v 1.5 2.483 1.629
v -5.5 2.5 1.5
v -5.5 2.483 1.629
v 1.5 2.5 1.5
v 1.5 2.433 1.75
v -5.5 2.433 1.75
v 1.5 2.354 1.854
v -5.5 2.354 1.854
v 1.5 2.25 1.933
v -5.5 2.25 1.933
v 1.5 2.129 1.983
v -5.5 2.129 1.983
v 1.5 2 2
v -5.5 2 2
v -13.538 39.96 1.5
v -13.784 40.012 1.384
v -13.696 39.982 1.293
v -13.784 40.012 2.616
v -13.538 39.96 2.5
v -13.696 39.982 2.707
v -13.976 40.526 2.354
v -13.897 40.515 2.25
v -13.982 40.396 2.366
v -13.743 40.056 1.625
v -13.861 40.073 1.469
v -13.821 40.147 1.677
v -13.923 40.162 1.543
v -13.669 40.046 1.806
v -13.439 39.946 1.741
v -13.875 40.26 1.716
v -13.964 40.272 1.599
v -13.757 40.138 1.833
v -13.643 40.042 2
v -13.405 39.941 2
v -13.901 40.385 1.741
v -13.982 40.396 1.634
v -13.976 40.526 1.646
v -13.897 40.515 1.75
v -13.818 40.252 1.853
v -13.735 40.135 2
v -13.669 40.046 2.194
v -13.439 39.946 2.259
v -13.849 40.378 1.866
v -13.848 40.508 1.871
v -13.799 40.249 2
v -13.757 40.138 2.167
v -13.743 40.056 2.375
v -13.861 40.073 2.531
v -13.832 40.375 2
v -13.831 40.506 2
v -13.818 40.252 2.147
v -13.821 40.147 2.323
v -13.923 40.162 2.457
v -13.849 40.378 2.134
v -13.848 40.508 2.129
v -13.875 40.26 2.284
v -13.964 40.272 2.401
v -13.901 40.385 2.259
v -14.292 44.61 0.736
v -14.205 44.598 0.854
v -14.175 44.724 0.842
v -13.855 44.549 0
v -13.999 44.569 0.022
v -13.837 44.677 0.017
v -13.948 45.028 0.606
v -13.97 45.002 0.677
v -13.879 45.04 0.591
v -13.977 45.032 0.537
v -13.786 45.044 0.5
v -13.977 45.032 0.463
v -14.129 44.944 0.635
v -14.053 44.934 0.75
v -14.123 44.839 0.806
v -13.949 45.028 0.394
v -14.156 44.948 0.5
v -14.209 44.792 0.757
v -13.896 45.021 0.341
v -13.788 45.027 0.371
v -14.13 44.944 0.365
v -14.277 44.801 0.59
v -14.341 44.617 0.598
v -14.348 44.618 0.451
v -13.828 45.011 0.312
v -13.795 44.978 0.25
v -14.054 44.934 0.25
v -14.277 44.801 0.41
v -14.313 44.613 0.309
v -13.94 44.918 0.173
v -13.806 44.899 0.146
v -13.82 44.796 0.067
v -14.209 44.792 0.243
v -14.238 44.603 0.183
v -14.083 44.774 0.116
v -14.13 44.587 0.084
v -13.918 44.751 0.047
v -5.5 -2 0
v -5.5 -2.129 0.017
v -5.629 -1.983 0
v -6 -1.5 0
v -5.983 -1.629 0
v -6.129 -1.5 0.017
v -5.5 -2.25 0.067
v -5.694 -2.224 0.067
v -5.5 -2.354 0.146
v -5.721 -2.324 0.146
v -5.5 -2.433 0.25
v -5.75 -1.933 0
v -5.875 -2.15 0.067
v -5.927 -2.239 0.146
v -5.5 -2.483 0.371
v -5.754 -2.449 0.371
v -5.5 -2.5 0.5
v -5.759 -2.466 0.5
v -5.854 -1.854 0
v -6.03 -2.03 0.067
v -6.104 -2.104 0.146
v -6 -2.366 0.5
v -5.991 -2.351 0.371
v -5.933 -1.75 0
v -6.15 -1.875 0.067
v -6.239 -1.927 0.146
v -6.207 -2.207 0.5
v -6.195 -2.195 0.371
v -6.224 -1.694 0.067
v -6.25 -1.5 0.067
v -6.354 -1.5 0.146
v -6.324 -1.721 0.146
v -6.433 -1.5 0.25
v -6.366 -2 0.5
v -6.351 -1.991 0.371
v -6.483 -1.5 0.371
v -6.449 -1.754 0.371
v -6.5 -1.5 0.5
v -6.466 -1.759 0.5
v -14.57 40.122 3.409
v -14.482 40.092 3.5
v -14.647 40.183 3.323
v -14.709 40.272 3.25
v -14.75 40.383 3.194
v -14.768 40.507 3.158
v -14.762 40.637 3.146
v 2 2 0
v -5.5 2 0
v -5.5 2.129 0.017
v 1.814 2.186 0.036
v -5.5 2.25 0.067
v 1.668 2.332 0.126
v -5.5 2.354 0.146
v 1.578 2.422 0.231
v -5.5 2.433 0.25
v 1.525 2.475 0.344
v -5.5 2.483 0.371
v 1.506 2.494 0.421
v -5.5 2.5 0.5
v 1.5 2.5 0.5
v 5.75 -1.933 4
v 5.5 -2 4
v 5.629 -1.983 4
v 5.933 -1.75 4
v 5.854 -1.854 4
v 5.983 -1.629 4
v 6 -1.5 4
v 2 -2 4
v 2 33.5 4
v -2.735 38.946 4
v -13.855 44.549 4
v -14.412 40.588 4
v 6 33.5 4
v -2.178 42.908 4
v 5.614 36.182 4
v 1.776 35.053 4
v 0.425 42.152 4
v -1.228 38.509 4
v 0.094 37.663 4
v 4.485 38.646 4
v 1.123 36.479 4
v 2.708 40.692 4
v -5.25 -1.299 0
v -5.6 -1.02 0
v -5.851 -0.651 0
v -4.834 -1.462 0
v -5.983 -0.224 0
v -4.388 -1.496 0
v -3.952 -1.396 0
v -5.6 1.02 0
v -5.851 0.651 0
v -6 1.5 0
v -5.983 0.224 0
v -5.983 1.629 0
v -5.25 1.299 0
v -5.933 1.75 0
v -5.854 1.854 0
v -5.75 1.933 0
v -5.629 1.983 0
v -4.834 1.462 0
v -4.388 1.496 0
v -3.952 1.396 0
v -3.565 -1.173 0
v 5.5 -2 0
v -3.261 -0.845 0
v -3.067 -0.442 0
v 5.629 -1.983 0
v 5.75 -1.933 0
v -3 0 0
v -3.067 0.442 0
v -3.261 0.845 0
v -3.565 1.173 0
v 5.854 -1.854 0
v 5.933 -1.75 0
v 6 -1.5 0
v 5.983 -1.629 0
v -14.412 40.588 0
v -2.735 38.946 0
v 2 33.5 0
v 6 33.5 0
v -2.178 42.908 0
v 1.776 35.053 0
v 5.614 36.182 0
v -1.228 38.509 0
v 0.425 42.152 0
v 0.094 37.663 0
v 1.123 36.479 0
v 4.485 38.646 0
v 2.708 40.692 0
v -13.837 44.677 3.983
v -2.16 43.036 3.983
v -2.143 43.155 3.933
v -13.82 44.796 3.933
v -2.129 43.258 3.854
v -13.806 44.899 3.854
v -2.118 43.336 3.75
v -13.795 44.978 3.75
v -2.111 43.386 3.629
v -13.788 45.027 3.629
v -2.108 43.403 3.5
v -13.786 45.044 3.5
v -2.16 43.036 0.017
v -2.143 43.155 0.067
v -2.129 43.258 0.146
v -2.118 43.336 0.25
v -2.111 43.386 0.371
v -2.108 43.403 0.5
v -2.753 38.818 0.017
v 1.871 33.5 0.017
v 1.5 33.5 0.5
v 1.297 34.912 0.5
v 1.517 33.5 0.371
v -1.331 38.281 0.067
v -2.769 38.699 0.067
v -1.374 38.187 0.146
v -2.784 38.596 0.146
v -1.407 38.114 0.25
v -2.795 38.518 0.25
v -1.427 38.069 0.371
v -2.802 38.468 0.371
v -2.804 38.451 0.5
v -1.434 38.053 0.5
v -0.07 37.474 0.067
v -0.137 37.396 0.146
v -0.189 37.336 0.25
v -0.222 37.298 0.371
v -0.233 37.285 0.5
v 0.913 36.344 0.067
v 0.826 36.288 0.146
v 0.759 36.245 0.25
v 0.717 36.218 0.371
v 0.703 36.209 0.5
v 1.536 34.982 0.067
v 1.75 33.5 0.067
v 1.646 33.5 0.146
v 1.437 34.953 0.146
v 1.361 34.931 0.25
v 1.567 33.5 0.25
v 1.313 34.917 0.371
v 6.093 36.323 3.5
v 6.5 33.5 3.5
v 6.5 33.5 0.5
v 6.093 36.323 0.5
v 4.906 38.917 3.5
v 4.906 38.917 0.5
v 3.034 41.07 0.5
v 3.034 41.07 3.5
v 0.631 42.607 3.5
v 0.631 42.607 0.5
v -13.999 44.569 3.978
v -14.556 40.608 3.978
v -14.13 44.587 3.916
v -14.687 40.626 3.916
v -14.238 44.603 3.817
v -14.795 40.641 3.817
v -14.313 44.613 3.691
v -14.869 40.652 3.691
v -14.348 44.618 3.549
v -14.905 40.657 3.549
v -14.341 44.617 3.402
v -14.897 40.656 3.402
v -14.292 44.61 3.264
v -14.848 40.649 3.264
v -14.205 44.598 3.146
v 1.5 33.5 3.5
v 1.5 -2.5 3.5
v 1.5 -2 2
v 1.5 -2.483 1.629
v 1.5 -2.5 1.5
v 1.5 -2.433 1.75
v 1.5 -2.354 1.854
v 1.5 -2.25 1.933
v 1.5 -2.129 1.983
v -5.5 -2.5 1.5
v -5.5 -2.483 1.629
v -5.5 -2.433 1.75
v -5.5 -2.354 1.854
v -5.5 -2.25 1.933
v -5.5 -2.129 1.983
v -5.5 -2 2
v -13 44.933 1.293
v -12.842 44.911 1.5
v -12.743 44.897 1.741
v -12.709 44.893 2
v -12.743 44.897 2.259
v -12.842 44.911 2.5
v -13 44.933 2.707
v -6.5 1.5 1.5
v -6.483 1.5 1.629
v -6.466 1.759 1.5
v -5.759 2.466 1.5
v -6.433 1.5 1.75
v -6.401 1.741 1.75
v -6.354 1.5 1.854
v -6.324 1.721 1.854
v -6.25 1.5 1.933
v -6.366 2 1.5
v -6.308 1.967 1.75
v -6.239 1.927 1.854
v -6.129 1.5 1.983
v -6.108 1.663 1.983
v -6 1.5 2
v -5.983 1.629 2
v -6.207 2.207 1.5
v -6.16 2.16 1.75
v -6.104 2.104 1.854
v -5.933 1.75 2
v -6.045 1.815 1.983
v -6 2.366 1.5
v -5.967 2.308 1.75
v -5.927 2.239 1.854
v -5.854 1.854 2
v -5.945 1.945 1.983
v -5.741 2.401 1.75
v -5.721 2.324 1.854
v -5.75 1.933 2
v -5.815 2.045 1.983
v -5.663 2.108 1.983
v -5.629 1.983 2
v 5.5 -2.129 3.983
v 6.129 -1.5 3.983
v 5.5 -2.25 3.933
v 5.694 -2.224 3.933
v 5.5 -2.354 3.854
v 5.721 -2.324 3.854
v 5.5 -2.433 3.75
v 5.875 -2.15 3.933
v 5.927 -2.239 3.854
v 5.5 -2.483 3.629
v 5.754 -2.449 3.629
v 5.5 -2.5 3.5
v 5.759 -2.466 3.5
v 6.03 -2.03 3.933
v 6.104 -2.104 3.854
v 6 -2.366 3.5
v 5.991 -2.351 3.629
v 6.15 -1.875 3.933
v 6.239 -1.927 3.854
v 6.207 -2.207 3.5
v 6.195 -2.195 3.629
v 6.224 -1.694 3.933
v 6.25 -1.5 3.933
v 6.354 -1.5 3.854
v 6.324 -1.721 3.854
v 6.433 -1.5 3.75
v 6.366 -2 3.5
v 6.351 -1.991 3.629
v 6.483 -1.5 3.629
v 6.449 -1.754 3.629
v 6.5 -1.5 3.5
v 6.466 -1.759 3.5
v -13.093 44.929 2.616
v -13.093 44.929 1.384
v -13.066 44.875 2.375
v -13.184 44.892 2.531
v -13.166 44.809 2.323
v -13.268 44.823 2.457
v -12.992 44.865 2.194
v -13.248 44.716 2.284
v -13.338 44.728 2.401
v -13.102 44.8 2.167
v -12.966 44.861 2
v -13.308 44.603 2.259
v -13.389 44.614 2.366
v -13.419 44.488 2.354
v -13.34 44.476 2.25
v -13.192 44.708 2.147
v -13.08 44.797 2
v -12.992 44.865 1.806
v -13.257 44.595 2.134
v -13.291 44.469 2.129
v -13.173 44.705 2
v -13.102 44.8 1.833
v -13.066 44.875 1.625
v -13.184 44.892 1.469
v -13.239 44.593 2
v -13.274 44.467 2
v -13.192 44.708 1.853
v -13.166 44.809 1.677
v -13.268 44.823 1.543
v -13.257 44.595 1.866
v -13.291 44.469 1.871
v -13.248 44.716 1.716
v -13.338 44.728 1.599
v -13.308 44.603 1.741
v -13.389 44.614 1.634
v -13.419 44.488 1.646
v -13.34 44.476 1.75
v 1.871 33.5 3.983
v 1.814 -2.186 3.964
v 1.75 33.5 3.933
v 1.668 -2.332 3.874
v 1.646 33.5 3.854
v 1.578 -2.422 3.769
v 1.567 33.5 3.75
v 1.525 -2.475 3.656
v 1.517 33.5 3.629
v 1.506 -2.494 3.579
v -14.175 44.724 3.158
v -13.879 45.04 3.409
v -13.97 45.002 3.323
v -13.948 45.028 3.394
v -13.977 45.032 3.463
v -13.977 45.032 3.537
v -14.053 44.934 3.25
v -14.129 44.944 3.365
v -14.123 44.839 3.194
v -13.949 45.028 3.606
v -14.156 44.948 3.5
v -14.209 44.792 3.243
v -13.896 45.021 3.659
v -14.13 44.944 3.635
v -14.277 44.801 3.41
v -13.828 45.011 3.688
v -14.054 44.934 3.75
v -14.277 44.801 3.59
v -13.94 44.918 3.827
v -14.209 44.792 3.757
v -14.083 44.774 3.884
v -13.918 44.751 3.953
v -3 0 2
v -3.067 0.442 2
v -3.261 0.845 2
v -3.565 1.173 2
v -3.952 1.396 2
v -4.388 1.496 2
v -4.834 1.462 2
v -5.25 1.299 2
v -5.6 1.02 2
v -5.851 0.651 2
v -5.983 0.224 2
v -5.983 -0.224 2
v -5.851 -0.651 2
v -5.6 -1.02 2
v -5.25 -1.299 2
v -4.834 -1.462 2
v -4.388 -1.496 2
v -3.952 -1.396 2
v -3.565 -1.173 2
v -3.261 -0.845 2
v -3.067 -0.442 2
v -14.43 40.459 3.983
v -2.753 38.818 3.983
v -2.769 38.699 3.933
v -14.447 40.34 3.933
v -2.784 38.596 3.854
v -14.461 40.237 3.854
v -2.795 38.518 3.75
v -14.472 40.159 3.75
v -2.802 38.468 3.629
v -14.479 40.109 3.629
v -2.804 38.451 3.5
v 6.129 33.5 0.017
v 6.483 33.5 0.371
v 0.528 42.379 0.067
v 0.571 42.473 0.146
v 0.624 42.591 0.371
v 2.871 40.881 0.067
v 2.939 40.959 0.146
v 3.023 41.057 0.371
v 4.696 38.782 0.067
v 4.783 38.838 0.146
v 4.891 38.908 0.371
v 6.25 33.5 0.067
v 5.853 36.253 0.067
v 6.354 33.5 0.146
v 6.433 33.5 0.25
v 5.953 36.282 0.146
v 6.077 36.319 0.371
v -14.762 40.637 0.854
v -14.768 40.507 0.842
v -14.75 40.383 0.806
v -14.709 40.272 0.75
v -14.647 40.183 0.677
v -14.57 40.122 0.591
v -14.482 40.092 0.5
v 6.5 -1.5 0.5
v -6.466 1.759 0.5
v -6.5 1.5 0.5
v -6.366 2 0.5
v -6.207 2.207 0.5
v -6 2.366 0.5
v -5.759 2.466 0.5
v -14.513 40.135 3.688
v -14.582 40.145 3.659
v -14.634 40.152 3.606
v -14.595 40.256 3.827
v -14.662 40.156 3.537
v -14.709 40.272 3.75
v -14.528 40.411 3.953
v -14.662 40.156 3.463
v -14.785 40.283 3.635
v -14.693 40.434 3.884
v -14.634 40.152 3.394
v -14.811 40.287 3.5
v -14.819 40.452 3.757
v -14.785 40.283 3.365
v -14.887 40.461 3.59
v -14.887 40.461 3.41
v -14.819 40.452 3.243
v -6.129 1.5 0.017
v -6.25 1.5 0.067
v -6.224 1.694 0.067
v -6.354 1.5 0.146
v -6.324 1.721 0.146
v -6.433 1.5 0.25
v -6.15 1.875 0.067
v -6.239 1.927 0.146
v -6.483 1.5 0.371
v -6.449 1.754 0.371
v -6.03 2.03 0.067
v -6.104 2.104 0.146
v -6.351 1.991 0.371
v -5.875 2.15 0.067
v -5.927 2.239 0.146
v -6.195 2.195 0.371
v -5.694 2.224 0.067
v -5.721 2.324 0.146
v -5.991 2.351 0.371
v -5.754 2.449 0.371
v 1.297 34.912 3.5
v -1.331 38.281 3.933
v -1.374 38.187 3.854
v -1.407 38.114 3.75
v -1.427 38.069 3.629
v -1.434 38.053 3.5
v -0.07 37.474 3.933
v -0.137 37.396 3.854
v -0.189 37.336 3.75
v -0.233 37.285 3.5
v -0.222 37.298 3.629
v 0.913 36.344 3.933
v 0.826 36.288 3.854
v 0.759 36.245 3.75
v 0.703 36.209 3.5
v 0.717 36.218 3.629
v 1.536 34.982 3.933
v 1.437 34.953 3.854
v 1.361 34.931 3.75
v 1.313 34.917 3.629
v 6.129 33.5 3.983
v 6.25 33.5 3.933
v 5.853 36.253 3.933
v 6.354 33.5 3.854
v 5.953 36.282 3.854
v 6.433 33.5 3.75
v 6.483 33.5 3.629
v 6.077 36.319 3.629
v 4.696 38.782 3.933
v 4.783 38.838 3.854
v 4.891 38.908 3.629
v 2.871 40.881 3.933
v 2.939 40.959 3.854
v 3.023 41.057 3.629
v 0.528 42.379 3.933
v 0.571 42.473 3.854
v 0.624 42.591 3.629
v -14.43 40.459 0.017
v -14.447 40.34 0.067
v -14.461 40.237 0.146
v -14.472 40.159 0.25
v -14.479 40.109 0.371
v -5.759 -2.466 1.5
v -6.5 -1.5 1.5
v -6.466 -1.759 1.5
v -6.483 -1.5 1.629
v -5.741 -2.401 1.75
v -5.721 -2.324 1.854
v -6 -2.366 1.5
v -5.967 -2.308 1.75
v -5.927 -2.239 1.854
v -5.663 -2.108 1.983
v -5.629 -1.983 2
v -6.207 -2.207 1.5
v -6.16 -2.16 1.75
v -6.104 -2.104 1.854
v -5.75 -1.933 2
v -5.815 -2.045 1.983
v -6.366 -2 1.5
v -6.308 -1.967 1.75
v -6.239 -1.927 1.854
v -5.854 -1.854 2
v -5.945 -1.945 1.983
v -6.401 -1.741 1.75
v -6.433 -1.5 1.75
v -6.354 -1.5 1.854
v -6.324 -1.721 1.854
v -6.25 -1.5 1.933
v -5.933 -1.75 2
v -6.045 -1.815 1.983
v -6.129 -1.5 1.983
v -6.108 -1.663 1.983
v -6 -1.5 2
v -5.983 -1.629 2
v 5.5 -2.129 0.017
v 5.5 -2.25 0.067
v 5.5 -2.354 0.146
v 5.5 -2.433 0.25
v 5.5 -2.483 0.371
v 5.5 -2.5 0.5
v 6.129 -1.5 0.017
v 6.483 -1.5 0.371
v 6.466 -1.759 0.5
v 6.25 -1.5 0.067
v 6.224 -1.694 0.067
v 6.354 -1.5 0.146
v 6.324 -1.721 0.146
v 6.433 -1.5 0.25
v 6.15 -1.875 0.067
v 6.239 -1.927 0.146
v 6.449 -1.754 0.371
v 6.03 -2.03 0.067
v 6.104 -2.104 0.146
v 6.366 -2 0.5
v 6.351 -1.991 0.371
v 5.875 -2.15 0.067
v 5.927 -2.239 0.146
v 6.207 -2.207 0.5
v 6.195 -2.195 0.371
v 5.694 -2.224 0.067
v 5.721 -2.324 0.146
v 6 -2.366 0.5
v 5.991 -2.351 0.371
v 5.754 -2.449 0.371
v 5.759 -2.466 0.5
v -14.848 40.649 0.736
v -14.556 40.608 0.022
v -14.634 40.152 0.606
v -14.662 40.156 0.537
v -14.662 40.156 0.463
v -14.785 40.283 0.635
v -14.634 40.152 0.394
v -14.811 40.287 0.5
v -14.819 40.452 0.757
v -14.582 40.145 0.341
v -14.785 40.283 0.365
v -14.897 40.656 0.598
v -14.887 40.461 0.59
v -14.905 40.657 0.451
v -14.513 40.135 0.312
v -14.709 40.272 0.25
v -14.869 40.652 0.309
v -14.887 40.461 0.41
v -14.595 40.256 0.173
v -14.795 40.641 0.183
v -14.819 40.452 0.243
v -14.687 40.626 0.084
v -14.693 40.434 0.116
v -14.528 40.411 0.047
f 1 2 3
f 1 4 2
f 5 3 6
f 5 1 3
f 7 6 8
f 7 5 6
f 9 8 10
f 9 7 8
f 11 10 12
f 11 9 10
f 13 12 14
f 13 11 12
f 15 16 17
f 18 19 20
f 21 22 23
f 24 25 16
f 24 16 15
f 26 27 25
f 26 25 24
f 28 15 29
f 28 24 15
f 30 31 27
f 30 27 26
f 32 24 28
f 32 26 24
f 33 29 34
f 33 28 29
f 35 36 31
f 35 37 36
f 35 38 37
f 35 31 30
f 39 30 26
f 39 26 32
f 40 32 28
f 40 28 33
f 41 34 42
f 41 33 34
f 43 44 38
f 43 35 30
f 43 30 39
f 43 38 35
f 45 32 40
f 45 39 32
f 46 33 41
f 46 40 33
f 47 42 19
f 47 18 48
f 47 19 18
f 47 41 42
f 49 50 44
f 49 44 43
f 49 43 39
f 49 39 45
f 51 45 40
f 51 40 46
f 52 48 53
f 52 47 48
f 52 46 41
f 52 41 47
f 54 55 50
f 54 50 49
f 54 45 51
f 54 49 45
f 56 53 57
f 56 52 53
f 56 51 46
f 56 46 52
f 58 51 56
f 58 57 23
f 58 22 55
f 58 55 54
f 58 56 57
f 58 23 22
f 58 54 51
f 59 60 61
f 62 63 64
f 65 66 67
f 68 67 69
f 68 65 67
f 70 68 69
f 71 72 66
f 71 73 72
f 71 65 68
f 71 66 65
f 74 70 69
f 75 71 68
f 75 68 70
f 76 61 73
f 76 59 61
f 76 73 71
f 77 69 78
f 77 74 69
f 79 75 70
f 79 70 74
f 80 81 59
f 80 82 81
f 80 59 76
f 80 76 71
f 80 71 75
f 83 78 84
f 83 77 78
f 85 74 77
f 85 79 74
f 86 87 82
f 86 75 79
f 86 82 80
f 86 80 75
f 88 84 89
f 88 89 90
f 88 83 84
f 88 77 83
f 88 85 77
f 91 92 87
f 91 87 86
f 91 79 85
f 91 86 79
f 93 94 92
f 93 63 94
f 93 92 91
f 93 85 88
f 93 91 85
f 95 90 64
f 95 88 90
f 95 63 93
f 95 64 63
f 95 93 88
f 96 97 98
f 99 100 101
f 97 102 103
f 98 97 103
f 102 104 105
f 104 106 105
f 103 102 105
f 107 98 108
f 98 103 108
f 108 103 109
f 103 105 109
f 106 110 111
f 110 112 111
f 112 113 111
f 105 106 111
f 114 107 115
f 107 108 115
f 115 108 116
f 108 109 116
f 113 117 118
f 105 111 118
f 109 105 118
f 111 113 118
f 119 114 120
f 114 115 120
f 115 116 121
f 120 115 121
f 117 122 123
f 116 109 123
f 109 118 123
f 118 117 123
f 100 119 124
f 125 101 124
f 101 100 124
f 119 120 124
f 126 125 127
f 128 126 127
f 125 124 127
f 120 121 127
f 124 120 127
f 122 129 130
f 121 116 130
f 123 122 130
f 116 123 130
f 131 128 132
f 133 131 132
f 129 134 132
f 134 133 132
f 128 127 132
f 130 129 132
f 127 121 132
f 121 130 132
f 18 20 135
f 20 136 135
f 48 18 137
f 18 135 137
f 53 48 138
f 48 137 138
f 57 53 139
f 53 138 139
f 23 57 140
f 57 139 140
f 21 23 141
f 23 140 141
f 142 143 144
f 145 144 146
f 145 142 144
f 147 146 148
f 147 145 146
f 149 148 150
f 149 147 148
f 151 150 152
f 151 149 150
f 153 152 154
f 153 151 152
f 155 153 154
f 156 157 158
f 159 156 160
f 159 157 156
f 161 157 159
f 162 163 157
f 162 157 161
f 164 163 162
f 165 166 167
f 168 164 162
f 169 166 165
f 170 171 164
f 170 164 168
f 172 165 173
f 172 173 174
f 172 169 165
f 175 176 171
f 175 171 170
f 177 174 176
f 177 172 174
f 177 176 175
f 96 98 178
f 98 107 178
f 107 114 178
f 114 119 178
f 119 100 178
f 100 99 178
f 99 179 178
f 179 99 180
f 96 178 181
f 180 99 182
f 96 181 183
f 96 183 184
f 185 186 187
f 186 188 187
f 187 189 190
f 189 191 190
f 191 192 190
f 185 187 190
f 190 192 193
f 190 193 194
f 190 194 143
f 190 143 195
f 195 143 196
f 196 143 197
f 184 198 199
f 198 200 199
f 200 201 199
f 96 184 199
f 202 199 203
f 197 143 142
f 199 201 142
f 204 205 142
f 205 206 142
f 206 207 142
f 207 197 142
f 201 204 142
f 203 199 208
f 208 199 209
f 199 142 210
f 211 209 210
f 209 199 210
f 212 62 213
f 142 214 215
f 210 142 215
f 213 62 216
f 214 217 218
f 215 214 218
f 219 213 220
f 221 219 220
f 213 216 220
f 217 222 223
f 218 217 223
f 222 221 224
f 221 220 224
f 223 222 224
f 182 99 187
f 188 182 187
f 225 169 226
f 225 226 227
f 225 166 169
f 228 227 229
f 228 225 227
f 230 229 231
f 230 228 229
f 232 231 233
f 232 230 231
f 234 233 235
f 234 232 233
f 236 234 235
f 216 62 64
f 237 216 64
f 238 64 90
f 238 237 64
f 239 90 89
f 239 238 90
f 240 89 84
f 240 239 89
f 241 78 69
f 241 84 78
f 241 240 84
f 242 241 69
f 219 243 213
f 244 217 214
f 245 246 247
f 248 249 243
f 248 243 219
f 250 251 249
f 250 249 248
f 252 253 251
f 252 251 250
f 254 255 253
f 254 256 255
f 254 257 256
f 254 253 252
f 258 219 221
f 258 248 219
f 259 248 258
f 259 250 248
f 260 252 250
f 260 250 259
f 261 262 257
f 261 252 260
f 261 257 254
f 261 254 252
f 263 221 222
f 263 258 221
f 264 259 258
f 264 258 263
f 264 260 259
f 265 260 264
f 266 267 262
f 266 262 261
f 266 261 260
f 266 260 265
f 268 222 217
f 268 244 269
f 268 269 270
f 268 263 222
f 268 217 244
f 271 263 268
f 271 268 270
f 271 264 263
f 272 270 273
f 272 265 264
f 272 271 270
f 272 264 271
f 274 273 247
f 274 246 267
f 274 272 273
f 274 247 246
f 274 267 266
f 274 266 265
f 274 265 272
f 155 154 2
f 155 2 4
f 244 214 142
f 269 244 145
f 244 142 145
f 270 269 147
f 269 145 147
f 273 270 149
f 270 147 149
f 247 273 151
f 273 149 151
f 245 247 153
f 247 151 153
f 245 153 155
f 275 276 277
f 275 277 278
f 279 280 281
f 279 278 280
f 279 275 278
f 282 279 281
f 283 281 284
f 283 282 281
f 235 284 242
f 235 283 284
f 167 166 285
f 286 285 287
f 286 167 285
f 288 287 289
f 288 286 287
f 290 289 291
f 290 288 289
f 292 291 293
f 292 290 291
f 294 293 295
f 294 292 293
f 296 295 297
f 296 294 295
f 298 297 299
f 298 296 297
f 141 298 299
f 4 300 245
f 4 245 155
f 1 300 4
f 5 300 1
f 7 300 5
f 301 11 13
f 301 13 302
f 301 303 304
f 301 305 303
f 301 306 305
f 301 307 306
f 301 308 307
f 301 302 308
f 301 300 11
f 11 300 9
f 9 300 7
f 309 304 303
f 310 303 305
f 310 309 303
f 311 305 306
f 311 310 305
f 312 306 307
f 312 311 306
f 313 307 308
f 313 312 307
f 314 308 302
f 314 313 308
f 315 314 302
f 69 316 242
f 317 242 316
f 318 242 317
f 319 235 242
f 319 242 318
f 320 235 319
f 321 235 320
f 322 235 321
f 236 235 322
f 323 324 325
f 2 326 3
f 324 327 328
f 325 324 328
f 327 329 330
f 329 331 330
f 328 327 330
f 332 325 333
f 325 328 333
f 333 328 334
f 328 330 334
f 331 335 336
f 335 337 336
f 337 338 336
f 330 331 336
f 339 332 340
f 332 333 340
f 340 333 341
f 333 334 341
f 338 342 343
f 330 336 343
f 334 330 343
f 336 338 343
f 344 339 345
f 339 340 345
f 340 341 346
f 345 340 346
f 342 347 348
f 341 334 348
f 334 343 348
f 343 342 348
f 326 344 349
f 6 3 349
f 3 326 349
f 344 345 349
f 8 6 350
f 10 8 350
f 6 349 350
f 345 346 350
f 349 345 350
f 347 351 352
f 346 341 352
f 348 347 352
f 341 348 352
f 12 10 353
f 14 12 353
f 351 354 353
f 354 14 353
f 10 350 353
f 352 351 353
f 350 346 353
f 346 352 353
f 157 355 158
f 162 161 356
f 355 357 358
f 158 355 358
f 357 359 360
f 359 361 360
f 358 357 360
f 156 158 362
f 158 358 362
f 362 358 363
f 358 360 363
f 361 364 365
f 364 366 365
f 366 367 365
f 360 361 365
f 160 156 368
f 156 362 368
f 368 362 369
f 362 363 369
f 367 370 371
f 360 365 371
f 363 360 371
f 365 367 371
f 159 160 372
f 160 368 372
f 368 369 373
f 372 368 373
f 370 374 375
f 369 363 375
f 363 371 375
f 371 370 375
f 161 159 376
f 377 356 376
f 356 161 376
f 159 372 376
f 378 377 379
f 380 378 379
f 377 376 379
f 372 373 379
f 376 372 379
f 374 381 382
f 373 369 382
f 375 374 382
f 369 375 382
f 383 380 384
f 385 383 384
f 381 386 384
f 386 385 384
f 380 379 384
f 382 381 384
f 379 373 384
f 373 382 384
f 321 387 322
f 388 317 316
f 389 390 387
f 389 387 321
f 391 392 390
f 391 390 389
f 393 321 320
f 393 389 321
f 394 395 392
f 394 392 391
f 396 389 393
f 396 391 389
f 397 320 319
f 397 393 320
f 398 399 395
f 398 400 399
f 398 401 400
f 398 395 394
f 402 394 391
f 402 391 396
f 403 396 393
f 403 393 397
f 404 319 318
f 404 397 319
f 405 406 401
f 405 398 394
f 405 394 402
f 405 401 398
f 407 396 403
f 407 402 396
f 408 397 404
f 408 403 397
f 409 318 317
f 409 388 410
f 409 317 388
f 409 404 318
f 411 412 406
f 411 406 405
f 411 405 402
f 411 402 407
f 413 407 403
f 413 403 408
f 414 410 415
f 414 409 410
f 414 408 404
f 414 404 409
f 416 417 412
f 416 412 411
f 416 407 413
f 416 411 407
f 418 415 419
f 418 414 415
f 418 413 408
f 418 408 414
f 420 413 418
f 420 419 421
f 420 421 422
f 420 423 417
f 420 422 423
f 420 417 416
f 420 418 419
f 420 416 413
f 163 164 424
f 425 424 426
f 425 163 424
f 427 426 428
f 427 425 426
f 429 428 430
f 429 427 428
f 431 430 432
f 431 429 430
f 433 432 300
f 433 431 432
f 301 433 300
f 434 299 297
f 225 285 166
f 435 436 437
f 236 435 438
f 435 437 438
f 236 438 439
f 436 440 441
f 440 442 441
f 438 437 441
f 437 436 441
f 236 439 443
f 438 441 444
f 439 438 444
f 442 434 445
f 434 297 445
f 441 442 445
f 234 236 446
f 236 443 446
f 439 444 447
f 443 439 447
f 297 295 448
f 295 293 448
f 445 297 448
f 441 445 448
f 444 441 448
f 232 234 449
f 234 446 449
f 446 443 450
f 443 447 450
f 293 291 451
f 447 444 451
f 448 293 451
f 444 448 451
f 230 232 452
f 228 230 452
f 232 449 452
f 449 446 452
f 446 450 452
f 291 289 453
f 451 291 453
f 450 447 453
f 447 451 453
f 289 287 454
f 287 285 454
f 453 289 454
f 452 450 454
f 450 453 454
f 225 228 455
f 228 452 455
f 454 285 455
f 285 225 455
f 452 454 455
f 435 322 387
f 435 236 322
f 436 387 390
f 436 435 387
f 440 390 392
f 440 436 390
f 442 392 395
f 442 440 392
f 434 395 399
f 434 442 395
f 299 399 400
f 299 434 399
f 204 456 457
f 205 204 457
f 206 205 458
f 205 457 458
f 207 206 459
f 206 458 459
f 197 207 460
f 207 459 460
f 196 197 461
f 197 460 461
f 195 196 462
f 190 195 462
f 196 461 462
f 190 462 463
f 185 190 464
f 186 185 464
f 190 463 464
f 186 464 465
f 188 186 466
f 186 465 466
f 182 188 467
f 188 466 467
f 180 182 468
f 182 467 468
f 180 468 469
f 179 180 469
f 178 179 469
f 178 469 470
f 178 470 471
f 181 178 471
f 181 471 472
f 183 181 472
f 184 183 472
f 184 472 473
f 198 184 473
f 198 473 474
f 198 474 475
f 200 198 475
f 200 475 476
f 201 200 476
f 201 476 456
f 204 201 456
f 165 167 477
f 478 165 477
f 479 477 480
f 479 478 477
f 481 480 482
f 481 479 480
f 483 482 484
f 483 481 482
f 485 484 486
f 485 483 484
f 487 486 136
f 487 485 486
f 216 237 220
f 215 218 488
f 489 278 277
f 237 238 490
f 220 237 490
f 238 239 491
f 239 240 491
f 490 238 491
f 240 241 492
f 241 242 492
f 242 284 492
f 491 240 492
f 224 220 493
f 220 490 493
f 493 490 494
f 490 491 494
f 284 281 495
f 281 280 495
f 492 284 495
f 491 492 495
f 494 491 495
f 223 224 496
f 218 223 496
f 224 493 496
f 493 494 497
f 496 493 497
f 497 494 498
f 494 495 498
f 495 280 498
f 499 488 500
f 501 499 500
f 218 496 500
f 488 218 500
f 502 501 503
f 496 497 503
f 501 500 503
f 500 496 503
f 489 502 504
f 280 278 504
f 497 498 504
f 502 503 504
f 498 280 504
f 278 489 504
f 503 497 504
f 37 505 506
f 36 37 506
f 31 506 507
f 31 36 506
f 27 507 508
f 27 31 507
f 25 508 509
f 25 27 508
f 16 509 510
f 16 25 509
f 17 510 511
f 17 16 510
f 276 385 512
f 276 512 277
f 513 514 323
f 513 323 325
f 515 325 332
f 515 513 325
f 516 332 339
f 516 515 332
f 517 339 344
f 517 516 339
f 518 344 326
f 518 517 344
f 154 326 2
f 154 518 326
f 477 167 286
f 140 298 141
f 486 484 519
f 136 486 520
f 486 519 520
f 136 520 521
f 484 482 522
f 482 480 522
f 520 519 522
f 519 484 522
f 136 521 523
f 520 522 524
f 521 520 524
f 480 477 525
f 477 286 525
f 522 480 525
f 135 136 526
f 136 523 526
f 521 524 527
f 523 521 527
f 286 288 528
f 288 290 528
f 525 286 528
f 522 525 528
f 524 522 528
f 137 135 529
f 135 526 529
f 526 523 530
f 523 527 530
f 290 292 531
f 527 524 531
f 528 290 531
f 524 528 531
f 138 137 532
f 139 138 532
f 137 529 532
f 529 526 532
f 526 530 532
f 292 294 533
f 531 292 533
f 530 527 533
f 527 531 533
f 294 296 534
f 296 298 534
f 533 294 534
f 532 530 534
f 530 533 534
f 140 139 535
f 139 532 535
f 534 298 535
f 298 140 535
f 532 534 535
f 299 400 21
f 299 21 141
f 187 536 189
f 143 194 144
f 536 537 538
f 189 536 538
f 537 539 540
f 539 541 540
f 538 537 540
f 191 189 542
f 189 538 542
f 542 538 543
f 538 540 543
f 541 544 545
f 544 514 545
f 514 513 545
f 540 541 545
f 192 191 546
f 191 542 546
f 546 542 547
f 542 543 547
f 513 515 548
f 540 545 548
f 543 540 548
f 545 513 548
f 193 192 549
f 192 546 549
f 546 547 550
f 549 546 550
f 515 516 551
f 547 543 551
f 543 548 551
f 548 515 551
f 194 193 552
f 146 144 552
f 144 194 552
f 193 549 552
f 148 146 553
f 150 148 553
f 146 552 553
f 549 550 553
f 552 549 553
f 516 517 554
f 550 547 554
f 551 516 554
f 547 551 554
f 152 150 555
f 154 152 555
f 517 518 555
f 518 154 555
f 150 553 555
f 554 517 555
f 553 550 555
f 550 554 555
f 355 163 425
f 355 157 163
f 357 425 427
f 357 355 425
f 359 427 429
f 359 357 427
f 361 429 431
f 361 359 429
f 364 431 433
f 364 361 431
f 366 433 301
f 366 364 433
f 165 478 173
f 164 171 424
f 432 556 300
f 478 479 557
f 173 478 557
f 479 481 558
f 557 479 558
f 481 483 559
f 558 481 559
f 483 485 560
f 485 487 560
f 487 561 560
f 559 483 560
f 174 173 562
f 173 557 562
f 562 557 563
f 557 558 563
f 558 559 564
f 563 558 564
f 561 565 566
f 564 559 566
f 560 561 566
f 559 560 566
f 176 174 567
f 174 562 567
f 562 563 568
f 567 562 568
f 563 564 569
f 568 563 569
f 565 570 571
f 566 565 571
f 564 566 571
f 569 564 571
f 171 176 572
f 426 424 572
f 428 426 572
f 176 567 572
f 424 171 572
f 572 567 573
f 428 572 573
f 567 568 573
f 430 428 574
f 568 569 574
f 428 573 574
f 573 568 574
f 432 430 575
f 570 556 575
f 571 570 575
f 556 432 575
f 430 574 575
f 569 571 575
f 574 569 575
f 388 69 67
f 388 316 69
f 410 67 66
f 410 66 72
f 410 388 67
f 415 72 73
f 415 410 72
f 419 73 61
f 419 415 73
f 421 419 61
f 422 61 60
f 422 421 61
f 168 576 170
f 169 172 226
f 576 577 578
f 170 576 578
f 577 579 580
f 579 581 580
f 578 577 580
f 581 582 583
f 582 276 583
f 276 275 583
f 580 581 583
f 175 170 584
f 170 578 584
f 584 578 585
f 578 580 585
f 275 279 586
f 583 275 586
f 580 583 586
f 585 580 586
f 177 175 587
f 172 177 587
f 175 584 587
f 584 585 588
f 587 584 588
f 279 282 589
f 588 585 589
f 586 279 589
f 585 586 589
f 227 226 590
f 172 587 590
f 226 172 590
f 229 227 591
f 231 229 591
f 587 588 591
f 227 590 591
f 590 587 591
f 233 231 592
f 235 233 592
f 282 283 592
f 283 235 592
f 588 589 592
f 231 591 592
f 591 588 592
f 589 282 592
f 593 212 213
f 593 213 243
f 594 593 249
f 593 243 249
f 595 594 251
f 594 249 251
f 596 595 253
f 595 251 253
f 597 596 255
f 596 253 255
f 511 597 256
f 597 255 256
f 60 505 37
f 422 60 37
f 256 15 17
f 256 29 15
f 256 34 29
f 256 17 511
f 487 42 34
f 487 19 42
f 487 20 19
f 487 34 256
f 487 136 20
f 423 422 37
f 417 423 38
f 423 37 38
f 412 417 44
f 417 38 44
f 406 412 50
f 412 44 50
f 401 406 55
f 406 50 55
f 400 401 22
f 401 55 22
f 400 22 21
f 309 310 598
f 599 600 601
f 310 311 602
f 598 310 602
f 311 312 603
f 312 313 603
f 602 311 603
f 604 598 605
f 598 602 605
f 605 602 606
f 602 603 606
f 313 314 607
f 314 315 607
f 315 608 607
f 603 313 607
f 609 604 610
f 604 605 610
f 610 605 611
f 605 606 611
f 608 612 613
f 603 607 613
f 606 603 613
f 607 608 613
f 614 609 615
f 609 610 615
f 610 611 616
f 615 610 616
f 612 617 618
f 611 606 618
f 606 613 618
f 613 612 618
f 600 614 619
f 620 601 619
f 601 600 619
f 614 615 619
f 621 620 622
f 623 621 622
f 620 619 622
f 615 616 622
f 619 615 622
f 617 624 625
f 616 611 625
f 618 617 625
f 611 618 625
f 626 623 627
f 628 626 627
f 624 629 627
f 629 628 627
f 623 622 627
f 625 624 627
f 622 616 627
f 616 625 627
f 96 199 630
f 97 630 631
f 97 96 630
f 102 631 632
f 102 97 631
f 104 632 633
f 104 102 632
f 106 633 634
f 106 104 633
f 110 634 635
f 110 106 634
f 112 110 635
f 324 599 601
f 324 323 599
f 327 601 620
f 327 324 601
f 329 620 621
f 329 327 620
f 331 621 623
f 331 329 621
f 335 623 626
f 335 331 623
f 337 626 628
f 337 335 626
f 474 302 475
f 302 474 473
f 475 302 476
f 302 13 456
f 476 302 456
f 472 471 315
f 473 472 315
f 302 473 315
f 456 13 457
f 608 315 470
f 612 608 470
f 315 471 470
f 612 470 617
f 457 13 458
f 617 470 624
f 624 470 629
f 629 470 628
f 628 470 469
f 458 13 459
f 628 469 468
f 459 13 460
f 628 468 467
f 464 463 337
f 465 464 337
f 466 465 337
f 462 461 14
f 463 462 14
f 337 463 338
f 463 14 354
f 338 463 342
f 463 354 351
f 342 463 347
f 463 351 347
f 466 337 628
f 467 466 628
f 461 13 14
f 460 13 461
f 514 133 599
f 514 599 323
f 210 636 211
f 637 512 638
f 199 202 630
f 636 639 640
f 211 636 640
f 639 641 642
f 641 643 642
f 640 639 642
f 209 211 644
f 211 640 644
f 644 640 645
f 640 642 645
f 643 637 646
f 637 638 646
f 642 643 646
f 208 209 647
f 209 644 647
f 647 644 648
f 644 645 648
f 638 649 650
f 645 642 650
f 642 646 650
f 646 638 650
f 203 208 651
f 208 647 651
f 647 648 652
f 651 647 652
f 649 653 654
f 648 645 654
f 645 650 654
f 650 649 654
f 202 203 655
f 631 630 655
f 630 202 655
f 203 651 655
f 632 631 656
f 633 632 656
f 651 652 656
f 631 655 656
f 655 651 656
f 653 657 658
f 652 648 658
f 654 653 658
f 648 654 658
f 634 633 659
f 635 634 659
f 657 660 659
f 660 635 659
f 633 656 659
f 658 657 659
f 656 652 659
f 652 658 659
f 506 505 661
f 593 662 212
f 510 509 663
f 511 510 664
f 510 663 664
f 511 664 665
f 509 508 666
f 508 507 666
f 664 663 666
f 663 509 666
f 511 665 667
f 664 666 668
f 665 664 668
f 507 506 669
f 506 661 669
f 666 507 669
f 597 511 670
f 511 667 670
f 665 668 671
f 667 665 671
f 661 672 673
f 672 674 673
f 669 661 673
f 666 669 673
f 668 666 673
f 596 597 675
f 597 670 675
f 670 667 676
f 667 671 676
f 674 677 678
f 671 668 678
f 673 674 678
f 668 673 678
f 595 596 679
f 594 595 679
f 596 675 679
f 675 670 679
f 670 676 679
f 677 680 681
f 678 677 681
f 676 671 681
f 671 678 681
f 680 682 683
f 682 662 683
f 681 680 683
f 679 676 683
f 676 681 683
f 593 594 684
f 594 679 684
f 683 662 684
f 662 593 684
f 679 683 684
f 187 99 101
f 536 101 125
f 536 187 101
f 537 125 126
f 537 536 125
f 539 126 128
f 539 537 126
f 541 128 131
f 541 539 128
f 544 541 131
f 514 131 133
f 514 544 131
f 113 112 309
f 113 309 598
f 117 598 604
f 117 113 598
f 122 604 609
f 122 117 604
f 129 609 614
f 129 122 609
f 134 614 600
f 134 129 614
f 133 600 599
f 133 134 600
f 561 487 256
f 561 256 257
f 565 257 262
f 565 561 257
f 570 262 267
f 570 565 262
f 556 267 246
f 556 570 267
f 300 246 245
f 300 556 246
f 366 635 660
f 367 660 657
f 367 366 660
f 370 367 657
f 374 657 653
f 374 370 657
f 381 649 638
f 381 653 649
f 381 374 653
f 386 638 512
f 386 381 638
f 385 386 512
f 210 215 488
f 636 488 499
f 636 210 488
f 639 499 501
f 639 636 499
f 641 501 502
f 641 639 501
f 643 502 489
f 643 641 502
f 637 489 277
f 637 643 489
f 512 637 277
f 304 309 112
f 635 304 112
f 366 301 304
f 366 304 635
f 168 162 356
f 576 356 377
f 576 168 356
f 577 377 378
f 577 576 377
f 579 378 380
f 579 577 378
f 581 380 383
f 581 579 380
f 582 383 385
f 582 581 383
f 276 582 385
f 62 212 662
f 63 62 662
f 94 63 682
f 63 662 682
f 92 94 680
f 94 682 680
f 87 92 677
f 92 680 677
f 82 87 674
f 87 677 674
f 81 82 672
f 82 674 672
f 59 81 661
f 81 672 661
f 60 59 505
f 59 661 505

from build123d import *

# Parameters (mm, degrees)
EXTRUDE_1_DEPTH     = 2
EXTRUDE_2_DEPTH     = 2
CUT_EXTRUDE_1_DEPTH = 5
SKETCH_4_R          = 1.5
CUT_EXTRUDE_2_DEPTH = 48.894743495
FILLET_1_R          = 0.5


with BuildPart() as part:
    # 草图1 → 凸台-拉伸1 (new body)
    with BuildSketch(Plane.XY):
        with BuildLine():
            Line((-5.5, 2.5), (5.5, 2.5))
            ThreePointArc((5.5, 2.5), (6.207106781, 2.207106781), (6.5, 1.5))
            Line((6.5, 1.5), (6.5, -1.5))
            ThreePointArc((6.5, -1.5), (6.207106781, -2.207106781), (5.5, -2.5))
            Line((5.5, -2.5), (-5.5, -2.5))
            ThreePointArc((-5.5, -2.5), (-6.207106781, -2.207106781), (-6.5, -1.5))
            Line((-6.5, -1.5), (-6.5, 1.5))
            ThreePointArc((-6.5, 1.5), (-6.207106781, 2.207106781), (-5.5, 2.5))
        make_face()
    extrude(amount=EXTRUDE_1_DEPTH)

    # 草图2 → 凸台-拉伸2 (add, symmetric)
    with BuildSketch(Plane.XY.offset(2)):
        with BuildLine():
            Line((6.5, 1.5), (6.5, 33.5))
            ThreePointArc((6.5, 33.5), (4.047095802, 40.06059029), (-2.10826899, 43.402680687))
            Line((-2.10826899, 43.402680687), (-14.981753884, 45.211931))
            Line((-14.981753884, 45.211931), (-15.677619389, 40.260590656))
            Line((-15.677619389, 40.260590656), (-2.804134495, 38.451340344))
            ThreePointArc((-2.804134495, 38.451340344), (0.273547901, 36.780295145), (1.5, 33.5))
            Line((1.5, 33.5), (1.5, 2.5))
            Line((1.5, 2.5), (1.5, -2.5))
            Line((1.5, -2.5), (5.5, -2.5))
            ThreePointArc((5.5, -2.5), (6.207106781, -2.207106781), (6.5, -1.5))
            Line((6.5, -1.5), (6.5, 1.5))
        make_face()
    extrude(amount=EXTRUDE_2_DEPTH, both=True)

    # 草图3 → 切除-拉伸1 (cut)
    with BuildSketch(Plane(origin=(5.940864687, 42.271448722, 0), x_dir=(0.9902680687415704, -0.13917310096006608, 0), z_dir=(0.13917310096006608, 0.9902680687415704, 0))):
        Polygon((-21.128237123, 0), (-19.126013359, -2), (-21.128237123, -4), align=None)
    extrude(amount=-CUT_EXTRUDE_1_DEPTH, mode=Mode.SUBTRACT)

    # 草图4 → 切除-拉伸2 (cut, through all)
    with BuildSketch(Plane.XY.offset(2)):
        with Locations((-4.5, 0)):
            Circle(SKETCH_4_R)
    extrude(amount=-CUT_EXTRUDE_2_DEPTH, mode=Mode.SUBTRACT)

    # 圆角1
    fillet_1_edges = [part.edges().sort_by_distance(p)[0] for p in [
        (-6.5, 0, 0),
        (-6.207106781, 2.207106781, 0),
        (-6.207106781, 2.207106781, 2),
        (-6.5, 0, 2),
        (-6.207106781, -2.207106781, 2),
        (-2, -2.5, 2),
        (-2, 2.5, 0),
        (-2, 2.5, 2),
        (1.5, 18, 0),
        (4.047095802, 40.06059029, 0),
        (-8.545011437, 44.307305844, 0),
        (-15.329686636, 42.736260828, 0),
        (-9.240876942, 39.3559655, 0),
        (0.273547901, 36.780295145, 0),
        (6.5, 16, 4),
        (4.047095802, 40.06059029, 4),
        (-8.545011437, 44.307305844, 4),
        (-15.329686636, 42.736260828, 4),
        (-9.240876942, 39.3559655, 4),
        (0.273547901, 36.780295145, 4),
        (1.5, 15.5, 4),
        (3.5, -2.5, 4),
        (6.207106781, -2.207106781, 4),
        (-13.346948377, 42.457605138, 2),
        (-13.990384754, 45.072603155, 3),
        (-13.990384754, 45.072603155, 1),
        (-14.686250259, 40.121262811, 1),
        (-14.686250259, 40.121262811, 3),
        (6.5, 16, 0),
        (6.207106781, -2.207106781, 0),
        (0, -2.5, 0),
        (-6.207106781, -2.207106781, 0),
    ]]
    fillet(fillet_1_edges, radius=FILLET_1_R - 0.0001)  # a hair under: the kernel refuses the full size


solid = part.part
